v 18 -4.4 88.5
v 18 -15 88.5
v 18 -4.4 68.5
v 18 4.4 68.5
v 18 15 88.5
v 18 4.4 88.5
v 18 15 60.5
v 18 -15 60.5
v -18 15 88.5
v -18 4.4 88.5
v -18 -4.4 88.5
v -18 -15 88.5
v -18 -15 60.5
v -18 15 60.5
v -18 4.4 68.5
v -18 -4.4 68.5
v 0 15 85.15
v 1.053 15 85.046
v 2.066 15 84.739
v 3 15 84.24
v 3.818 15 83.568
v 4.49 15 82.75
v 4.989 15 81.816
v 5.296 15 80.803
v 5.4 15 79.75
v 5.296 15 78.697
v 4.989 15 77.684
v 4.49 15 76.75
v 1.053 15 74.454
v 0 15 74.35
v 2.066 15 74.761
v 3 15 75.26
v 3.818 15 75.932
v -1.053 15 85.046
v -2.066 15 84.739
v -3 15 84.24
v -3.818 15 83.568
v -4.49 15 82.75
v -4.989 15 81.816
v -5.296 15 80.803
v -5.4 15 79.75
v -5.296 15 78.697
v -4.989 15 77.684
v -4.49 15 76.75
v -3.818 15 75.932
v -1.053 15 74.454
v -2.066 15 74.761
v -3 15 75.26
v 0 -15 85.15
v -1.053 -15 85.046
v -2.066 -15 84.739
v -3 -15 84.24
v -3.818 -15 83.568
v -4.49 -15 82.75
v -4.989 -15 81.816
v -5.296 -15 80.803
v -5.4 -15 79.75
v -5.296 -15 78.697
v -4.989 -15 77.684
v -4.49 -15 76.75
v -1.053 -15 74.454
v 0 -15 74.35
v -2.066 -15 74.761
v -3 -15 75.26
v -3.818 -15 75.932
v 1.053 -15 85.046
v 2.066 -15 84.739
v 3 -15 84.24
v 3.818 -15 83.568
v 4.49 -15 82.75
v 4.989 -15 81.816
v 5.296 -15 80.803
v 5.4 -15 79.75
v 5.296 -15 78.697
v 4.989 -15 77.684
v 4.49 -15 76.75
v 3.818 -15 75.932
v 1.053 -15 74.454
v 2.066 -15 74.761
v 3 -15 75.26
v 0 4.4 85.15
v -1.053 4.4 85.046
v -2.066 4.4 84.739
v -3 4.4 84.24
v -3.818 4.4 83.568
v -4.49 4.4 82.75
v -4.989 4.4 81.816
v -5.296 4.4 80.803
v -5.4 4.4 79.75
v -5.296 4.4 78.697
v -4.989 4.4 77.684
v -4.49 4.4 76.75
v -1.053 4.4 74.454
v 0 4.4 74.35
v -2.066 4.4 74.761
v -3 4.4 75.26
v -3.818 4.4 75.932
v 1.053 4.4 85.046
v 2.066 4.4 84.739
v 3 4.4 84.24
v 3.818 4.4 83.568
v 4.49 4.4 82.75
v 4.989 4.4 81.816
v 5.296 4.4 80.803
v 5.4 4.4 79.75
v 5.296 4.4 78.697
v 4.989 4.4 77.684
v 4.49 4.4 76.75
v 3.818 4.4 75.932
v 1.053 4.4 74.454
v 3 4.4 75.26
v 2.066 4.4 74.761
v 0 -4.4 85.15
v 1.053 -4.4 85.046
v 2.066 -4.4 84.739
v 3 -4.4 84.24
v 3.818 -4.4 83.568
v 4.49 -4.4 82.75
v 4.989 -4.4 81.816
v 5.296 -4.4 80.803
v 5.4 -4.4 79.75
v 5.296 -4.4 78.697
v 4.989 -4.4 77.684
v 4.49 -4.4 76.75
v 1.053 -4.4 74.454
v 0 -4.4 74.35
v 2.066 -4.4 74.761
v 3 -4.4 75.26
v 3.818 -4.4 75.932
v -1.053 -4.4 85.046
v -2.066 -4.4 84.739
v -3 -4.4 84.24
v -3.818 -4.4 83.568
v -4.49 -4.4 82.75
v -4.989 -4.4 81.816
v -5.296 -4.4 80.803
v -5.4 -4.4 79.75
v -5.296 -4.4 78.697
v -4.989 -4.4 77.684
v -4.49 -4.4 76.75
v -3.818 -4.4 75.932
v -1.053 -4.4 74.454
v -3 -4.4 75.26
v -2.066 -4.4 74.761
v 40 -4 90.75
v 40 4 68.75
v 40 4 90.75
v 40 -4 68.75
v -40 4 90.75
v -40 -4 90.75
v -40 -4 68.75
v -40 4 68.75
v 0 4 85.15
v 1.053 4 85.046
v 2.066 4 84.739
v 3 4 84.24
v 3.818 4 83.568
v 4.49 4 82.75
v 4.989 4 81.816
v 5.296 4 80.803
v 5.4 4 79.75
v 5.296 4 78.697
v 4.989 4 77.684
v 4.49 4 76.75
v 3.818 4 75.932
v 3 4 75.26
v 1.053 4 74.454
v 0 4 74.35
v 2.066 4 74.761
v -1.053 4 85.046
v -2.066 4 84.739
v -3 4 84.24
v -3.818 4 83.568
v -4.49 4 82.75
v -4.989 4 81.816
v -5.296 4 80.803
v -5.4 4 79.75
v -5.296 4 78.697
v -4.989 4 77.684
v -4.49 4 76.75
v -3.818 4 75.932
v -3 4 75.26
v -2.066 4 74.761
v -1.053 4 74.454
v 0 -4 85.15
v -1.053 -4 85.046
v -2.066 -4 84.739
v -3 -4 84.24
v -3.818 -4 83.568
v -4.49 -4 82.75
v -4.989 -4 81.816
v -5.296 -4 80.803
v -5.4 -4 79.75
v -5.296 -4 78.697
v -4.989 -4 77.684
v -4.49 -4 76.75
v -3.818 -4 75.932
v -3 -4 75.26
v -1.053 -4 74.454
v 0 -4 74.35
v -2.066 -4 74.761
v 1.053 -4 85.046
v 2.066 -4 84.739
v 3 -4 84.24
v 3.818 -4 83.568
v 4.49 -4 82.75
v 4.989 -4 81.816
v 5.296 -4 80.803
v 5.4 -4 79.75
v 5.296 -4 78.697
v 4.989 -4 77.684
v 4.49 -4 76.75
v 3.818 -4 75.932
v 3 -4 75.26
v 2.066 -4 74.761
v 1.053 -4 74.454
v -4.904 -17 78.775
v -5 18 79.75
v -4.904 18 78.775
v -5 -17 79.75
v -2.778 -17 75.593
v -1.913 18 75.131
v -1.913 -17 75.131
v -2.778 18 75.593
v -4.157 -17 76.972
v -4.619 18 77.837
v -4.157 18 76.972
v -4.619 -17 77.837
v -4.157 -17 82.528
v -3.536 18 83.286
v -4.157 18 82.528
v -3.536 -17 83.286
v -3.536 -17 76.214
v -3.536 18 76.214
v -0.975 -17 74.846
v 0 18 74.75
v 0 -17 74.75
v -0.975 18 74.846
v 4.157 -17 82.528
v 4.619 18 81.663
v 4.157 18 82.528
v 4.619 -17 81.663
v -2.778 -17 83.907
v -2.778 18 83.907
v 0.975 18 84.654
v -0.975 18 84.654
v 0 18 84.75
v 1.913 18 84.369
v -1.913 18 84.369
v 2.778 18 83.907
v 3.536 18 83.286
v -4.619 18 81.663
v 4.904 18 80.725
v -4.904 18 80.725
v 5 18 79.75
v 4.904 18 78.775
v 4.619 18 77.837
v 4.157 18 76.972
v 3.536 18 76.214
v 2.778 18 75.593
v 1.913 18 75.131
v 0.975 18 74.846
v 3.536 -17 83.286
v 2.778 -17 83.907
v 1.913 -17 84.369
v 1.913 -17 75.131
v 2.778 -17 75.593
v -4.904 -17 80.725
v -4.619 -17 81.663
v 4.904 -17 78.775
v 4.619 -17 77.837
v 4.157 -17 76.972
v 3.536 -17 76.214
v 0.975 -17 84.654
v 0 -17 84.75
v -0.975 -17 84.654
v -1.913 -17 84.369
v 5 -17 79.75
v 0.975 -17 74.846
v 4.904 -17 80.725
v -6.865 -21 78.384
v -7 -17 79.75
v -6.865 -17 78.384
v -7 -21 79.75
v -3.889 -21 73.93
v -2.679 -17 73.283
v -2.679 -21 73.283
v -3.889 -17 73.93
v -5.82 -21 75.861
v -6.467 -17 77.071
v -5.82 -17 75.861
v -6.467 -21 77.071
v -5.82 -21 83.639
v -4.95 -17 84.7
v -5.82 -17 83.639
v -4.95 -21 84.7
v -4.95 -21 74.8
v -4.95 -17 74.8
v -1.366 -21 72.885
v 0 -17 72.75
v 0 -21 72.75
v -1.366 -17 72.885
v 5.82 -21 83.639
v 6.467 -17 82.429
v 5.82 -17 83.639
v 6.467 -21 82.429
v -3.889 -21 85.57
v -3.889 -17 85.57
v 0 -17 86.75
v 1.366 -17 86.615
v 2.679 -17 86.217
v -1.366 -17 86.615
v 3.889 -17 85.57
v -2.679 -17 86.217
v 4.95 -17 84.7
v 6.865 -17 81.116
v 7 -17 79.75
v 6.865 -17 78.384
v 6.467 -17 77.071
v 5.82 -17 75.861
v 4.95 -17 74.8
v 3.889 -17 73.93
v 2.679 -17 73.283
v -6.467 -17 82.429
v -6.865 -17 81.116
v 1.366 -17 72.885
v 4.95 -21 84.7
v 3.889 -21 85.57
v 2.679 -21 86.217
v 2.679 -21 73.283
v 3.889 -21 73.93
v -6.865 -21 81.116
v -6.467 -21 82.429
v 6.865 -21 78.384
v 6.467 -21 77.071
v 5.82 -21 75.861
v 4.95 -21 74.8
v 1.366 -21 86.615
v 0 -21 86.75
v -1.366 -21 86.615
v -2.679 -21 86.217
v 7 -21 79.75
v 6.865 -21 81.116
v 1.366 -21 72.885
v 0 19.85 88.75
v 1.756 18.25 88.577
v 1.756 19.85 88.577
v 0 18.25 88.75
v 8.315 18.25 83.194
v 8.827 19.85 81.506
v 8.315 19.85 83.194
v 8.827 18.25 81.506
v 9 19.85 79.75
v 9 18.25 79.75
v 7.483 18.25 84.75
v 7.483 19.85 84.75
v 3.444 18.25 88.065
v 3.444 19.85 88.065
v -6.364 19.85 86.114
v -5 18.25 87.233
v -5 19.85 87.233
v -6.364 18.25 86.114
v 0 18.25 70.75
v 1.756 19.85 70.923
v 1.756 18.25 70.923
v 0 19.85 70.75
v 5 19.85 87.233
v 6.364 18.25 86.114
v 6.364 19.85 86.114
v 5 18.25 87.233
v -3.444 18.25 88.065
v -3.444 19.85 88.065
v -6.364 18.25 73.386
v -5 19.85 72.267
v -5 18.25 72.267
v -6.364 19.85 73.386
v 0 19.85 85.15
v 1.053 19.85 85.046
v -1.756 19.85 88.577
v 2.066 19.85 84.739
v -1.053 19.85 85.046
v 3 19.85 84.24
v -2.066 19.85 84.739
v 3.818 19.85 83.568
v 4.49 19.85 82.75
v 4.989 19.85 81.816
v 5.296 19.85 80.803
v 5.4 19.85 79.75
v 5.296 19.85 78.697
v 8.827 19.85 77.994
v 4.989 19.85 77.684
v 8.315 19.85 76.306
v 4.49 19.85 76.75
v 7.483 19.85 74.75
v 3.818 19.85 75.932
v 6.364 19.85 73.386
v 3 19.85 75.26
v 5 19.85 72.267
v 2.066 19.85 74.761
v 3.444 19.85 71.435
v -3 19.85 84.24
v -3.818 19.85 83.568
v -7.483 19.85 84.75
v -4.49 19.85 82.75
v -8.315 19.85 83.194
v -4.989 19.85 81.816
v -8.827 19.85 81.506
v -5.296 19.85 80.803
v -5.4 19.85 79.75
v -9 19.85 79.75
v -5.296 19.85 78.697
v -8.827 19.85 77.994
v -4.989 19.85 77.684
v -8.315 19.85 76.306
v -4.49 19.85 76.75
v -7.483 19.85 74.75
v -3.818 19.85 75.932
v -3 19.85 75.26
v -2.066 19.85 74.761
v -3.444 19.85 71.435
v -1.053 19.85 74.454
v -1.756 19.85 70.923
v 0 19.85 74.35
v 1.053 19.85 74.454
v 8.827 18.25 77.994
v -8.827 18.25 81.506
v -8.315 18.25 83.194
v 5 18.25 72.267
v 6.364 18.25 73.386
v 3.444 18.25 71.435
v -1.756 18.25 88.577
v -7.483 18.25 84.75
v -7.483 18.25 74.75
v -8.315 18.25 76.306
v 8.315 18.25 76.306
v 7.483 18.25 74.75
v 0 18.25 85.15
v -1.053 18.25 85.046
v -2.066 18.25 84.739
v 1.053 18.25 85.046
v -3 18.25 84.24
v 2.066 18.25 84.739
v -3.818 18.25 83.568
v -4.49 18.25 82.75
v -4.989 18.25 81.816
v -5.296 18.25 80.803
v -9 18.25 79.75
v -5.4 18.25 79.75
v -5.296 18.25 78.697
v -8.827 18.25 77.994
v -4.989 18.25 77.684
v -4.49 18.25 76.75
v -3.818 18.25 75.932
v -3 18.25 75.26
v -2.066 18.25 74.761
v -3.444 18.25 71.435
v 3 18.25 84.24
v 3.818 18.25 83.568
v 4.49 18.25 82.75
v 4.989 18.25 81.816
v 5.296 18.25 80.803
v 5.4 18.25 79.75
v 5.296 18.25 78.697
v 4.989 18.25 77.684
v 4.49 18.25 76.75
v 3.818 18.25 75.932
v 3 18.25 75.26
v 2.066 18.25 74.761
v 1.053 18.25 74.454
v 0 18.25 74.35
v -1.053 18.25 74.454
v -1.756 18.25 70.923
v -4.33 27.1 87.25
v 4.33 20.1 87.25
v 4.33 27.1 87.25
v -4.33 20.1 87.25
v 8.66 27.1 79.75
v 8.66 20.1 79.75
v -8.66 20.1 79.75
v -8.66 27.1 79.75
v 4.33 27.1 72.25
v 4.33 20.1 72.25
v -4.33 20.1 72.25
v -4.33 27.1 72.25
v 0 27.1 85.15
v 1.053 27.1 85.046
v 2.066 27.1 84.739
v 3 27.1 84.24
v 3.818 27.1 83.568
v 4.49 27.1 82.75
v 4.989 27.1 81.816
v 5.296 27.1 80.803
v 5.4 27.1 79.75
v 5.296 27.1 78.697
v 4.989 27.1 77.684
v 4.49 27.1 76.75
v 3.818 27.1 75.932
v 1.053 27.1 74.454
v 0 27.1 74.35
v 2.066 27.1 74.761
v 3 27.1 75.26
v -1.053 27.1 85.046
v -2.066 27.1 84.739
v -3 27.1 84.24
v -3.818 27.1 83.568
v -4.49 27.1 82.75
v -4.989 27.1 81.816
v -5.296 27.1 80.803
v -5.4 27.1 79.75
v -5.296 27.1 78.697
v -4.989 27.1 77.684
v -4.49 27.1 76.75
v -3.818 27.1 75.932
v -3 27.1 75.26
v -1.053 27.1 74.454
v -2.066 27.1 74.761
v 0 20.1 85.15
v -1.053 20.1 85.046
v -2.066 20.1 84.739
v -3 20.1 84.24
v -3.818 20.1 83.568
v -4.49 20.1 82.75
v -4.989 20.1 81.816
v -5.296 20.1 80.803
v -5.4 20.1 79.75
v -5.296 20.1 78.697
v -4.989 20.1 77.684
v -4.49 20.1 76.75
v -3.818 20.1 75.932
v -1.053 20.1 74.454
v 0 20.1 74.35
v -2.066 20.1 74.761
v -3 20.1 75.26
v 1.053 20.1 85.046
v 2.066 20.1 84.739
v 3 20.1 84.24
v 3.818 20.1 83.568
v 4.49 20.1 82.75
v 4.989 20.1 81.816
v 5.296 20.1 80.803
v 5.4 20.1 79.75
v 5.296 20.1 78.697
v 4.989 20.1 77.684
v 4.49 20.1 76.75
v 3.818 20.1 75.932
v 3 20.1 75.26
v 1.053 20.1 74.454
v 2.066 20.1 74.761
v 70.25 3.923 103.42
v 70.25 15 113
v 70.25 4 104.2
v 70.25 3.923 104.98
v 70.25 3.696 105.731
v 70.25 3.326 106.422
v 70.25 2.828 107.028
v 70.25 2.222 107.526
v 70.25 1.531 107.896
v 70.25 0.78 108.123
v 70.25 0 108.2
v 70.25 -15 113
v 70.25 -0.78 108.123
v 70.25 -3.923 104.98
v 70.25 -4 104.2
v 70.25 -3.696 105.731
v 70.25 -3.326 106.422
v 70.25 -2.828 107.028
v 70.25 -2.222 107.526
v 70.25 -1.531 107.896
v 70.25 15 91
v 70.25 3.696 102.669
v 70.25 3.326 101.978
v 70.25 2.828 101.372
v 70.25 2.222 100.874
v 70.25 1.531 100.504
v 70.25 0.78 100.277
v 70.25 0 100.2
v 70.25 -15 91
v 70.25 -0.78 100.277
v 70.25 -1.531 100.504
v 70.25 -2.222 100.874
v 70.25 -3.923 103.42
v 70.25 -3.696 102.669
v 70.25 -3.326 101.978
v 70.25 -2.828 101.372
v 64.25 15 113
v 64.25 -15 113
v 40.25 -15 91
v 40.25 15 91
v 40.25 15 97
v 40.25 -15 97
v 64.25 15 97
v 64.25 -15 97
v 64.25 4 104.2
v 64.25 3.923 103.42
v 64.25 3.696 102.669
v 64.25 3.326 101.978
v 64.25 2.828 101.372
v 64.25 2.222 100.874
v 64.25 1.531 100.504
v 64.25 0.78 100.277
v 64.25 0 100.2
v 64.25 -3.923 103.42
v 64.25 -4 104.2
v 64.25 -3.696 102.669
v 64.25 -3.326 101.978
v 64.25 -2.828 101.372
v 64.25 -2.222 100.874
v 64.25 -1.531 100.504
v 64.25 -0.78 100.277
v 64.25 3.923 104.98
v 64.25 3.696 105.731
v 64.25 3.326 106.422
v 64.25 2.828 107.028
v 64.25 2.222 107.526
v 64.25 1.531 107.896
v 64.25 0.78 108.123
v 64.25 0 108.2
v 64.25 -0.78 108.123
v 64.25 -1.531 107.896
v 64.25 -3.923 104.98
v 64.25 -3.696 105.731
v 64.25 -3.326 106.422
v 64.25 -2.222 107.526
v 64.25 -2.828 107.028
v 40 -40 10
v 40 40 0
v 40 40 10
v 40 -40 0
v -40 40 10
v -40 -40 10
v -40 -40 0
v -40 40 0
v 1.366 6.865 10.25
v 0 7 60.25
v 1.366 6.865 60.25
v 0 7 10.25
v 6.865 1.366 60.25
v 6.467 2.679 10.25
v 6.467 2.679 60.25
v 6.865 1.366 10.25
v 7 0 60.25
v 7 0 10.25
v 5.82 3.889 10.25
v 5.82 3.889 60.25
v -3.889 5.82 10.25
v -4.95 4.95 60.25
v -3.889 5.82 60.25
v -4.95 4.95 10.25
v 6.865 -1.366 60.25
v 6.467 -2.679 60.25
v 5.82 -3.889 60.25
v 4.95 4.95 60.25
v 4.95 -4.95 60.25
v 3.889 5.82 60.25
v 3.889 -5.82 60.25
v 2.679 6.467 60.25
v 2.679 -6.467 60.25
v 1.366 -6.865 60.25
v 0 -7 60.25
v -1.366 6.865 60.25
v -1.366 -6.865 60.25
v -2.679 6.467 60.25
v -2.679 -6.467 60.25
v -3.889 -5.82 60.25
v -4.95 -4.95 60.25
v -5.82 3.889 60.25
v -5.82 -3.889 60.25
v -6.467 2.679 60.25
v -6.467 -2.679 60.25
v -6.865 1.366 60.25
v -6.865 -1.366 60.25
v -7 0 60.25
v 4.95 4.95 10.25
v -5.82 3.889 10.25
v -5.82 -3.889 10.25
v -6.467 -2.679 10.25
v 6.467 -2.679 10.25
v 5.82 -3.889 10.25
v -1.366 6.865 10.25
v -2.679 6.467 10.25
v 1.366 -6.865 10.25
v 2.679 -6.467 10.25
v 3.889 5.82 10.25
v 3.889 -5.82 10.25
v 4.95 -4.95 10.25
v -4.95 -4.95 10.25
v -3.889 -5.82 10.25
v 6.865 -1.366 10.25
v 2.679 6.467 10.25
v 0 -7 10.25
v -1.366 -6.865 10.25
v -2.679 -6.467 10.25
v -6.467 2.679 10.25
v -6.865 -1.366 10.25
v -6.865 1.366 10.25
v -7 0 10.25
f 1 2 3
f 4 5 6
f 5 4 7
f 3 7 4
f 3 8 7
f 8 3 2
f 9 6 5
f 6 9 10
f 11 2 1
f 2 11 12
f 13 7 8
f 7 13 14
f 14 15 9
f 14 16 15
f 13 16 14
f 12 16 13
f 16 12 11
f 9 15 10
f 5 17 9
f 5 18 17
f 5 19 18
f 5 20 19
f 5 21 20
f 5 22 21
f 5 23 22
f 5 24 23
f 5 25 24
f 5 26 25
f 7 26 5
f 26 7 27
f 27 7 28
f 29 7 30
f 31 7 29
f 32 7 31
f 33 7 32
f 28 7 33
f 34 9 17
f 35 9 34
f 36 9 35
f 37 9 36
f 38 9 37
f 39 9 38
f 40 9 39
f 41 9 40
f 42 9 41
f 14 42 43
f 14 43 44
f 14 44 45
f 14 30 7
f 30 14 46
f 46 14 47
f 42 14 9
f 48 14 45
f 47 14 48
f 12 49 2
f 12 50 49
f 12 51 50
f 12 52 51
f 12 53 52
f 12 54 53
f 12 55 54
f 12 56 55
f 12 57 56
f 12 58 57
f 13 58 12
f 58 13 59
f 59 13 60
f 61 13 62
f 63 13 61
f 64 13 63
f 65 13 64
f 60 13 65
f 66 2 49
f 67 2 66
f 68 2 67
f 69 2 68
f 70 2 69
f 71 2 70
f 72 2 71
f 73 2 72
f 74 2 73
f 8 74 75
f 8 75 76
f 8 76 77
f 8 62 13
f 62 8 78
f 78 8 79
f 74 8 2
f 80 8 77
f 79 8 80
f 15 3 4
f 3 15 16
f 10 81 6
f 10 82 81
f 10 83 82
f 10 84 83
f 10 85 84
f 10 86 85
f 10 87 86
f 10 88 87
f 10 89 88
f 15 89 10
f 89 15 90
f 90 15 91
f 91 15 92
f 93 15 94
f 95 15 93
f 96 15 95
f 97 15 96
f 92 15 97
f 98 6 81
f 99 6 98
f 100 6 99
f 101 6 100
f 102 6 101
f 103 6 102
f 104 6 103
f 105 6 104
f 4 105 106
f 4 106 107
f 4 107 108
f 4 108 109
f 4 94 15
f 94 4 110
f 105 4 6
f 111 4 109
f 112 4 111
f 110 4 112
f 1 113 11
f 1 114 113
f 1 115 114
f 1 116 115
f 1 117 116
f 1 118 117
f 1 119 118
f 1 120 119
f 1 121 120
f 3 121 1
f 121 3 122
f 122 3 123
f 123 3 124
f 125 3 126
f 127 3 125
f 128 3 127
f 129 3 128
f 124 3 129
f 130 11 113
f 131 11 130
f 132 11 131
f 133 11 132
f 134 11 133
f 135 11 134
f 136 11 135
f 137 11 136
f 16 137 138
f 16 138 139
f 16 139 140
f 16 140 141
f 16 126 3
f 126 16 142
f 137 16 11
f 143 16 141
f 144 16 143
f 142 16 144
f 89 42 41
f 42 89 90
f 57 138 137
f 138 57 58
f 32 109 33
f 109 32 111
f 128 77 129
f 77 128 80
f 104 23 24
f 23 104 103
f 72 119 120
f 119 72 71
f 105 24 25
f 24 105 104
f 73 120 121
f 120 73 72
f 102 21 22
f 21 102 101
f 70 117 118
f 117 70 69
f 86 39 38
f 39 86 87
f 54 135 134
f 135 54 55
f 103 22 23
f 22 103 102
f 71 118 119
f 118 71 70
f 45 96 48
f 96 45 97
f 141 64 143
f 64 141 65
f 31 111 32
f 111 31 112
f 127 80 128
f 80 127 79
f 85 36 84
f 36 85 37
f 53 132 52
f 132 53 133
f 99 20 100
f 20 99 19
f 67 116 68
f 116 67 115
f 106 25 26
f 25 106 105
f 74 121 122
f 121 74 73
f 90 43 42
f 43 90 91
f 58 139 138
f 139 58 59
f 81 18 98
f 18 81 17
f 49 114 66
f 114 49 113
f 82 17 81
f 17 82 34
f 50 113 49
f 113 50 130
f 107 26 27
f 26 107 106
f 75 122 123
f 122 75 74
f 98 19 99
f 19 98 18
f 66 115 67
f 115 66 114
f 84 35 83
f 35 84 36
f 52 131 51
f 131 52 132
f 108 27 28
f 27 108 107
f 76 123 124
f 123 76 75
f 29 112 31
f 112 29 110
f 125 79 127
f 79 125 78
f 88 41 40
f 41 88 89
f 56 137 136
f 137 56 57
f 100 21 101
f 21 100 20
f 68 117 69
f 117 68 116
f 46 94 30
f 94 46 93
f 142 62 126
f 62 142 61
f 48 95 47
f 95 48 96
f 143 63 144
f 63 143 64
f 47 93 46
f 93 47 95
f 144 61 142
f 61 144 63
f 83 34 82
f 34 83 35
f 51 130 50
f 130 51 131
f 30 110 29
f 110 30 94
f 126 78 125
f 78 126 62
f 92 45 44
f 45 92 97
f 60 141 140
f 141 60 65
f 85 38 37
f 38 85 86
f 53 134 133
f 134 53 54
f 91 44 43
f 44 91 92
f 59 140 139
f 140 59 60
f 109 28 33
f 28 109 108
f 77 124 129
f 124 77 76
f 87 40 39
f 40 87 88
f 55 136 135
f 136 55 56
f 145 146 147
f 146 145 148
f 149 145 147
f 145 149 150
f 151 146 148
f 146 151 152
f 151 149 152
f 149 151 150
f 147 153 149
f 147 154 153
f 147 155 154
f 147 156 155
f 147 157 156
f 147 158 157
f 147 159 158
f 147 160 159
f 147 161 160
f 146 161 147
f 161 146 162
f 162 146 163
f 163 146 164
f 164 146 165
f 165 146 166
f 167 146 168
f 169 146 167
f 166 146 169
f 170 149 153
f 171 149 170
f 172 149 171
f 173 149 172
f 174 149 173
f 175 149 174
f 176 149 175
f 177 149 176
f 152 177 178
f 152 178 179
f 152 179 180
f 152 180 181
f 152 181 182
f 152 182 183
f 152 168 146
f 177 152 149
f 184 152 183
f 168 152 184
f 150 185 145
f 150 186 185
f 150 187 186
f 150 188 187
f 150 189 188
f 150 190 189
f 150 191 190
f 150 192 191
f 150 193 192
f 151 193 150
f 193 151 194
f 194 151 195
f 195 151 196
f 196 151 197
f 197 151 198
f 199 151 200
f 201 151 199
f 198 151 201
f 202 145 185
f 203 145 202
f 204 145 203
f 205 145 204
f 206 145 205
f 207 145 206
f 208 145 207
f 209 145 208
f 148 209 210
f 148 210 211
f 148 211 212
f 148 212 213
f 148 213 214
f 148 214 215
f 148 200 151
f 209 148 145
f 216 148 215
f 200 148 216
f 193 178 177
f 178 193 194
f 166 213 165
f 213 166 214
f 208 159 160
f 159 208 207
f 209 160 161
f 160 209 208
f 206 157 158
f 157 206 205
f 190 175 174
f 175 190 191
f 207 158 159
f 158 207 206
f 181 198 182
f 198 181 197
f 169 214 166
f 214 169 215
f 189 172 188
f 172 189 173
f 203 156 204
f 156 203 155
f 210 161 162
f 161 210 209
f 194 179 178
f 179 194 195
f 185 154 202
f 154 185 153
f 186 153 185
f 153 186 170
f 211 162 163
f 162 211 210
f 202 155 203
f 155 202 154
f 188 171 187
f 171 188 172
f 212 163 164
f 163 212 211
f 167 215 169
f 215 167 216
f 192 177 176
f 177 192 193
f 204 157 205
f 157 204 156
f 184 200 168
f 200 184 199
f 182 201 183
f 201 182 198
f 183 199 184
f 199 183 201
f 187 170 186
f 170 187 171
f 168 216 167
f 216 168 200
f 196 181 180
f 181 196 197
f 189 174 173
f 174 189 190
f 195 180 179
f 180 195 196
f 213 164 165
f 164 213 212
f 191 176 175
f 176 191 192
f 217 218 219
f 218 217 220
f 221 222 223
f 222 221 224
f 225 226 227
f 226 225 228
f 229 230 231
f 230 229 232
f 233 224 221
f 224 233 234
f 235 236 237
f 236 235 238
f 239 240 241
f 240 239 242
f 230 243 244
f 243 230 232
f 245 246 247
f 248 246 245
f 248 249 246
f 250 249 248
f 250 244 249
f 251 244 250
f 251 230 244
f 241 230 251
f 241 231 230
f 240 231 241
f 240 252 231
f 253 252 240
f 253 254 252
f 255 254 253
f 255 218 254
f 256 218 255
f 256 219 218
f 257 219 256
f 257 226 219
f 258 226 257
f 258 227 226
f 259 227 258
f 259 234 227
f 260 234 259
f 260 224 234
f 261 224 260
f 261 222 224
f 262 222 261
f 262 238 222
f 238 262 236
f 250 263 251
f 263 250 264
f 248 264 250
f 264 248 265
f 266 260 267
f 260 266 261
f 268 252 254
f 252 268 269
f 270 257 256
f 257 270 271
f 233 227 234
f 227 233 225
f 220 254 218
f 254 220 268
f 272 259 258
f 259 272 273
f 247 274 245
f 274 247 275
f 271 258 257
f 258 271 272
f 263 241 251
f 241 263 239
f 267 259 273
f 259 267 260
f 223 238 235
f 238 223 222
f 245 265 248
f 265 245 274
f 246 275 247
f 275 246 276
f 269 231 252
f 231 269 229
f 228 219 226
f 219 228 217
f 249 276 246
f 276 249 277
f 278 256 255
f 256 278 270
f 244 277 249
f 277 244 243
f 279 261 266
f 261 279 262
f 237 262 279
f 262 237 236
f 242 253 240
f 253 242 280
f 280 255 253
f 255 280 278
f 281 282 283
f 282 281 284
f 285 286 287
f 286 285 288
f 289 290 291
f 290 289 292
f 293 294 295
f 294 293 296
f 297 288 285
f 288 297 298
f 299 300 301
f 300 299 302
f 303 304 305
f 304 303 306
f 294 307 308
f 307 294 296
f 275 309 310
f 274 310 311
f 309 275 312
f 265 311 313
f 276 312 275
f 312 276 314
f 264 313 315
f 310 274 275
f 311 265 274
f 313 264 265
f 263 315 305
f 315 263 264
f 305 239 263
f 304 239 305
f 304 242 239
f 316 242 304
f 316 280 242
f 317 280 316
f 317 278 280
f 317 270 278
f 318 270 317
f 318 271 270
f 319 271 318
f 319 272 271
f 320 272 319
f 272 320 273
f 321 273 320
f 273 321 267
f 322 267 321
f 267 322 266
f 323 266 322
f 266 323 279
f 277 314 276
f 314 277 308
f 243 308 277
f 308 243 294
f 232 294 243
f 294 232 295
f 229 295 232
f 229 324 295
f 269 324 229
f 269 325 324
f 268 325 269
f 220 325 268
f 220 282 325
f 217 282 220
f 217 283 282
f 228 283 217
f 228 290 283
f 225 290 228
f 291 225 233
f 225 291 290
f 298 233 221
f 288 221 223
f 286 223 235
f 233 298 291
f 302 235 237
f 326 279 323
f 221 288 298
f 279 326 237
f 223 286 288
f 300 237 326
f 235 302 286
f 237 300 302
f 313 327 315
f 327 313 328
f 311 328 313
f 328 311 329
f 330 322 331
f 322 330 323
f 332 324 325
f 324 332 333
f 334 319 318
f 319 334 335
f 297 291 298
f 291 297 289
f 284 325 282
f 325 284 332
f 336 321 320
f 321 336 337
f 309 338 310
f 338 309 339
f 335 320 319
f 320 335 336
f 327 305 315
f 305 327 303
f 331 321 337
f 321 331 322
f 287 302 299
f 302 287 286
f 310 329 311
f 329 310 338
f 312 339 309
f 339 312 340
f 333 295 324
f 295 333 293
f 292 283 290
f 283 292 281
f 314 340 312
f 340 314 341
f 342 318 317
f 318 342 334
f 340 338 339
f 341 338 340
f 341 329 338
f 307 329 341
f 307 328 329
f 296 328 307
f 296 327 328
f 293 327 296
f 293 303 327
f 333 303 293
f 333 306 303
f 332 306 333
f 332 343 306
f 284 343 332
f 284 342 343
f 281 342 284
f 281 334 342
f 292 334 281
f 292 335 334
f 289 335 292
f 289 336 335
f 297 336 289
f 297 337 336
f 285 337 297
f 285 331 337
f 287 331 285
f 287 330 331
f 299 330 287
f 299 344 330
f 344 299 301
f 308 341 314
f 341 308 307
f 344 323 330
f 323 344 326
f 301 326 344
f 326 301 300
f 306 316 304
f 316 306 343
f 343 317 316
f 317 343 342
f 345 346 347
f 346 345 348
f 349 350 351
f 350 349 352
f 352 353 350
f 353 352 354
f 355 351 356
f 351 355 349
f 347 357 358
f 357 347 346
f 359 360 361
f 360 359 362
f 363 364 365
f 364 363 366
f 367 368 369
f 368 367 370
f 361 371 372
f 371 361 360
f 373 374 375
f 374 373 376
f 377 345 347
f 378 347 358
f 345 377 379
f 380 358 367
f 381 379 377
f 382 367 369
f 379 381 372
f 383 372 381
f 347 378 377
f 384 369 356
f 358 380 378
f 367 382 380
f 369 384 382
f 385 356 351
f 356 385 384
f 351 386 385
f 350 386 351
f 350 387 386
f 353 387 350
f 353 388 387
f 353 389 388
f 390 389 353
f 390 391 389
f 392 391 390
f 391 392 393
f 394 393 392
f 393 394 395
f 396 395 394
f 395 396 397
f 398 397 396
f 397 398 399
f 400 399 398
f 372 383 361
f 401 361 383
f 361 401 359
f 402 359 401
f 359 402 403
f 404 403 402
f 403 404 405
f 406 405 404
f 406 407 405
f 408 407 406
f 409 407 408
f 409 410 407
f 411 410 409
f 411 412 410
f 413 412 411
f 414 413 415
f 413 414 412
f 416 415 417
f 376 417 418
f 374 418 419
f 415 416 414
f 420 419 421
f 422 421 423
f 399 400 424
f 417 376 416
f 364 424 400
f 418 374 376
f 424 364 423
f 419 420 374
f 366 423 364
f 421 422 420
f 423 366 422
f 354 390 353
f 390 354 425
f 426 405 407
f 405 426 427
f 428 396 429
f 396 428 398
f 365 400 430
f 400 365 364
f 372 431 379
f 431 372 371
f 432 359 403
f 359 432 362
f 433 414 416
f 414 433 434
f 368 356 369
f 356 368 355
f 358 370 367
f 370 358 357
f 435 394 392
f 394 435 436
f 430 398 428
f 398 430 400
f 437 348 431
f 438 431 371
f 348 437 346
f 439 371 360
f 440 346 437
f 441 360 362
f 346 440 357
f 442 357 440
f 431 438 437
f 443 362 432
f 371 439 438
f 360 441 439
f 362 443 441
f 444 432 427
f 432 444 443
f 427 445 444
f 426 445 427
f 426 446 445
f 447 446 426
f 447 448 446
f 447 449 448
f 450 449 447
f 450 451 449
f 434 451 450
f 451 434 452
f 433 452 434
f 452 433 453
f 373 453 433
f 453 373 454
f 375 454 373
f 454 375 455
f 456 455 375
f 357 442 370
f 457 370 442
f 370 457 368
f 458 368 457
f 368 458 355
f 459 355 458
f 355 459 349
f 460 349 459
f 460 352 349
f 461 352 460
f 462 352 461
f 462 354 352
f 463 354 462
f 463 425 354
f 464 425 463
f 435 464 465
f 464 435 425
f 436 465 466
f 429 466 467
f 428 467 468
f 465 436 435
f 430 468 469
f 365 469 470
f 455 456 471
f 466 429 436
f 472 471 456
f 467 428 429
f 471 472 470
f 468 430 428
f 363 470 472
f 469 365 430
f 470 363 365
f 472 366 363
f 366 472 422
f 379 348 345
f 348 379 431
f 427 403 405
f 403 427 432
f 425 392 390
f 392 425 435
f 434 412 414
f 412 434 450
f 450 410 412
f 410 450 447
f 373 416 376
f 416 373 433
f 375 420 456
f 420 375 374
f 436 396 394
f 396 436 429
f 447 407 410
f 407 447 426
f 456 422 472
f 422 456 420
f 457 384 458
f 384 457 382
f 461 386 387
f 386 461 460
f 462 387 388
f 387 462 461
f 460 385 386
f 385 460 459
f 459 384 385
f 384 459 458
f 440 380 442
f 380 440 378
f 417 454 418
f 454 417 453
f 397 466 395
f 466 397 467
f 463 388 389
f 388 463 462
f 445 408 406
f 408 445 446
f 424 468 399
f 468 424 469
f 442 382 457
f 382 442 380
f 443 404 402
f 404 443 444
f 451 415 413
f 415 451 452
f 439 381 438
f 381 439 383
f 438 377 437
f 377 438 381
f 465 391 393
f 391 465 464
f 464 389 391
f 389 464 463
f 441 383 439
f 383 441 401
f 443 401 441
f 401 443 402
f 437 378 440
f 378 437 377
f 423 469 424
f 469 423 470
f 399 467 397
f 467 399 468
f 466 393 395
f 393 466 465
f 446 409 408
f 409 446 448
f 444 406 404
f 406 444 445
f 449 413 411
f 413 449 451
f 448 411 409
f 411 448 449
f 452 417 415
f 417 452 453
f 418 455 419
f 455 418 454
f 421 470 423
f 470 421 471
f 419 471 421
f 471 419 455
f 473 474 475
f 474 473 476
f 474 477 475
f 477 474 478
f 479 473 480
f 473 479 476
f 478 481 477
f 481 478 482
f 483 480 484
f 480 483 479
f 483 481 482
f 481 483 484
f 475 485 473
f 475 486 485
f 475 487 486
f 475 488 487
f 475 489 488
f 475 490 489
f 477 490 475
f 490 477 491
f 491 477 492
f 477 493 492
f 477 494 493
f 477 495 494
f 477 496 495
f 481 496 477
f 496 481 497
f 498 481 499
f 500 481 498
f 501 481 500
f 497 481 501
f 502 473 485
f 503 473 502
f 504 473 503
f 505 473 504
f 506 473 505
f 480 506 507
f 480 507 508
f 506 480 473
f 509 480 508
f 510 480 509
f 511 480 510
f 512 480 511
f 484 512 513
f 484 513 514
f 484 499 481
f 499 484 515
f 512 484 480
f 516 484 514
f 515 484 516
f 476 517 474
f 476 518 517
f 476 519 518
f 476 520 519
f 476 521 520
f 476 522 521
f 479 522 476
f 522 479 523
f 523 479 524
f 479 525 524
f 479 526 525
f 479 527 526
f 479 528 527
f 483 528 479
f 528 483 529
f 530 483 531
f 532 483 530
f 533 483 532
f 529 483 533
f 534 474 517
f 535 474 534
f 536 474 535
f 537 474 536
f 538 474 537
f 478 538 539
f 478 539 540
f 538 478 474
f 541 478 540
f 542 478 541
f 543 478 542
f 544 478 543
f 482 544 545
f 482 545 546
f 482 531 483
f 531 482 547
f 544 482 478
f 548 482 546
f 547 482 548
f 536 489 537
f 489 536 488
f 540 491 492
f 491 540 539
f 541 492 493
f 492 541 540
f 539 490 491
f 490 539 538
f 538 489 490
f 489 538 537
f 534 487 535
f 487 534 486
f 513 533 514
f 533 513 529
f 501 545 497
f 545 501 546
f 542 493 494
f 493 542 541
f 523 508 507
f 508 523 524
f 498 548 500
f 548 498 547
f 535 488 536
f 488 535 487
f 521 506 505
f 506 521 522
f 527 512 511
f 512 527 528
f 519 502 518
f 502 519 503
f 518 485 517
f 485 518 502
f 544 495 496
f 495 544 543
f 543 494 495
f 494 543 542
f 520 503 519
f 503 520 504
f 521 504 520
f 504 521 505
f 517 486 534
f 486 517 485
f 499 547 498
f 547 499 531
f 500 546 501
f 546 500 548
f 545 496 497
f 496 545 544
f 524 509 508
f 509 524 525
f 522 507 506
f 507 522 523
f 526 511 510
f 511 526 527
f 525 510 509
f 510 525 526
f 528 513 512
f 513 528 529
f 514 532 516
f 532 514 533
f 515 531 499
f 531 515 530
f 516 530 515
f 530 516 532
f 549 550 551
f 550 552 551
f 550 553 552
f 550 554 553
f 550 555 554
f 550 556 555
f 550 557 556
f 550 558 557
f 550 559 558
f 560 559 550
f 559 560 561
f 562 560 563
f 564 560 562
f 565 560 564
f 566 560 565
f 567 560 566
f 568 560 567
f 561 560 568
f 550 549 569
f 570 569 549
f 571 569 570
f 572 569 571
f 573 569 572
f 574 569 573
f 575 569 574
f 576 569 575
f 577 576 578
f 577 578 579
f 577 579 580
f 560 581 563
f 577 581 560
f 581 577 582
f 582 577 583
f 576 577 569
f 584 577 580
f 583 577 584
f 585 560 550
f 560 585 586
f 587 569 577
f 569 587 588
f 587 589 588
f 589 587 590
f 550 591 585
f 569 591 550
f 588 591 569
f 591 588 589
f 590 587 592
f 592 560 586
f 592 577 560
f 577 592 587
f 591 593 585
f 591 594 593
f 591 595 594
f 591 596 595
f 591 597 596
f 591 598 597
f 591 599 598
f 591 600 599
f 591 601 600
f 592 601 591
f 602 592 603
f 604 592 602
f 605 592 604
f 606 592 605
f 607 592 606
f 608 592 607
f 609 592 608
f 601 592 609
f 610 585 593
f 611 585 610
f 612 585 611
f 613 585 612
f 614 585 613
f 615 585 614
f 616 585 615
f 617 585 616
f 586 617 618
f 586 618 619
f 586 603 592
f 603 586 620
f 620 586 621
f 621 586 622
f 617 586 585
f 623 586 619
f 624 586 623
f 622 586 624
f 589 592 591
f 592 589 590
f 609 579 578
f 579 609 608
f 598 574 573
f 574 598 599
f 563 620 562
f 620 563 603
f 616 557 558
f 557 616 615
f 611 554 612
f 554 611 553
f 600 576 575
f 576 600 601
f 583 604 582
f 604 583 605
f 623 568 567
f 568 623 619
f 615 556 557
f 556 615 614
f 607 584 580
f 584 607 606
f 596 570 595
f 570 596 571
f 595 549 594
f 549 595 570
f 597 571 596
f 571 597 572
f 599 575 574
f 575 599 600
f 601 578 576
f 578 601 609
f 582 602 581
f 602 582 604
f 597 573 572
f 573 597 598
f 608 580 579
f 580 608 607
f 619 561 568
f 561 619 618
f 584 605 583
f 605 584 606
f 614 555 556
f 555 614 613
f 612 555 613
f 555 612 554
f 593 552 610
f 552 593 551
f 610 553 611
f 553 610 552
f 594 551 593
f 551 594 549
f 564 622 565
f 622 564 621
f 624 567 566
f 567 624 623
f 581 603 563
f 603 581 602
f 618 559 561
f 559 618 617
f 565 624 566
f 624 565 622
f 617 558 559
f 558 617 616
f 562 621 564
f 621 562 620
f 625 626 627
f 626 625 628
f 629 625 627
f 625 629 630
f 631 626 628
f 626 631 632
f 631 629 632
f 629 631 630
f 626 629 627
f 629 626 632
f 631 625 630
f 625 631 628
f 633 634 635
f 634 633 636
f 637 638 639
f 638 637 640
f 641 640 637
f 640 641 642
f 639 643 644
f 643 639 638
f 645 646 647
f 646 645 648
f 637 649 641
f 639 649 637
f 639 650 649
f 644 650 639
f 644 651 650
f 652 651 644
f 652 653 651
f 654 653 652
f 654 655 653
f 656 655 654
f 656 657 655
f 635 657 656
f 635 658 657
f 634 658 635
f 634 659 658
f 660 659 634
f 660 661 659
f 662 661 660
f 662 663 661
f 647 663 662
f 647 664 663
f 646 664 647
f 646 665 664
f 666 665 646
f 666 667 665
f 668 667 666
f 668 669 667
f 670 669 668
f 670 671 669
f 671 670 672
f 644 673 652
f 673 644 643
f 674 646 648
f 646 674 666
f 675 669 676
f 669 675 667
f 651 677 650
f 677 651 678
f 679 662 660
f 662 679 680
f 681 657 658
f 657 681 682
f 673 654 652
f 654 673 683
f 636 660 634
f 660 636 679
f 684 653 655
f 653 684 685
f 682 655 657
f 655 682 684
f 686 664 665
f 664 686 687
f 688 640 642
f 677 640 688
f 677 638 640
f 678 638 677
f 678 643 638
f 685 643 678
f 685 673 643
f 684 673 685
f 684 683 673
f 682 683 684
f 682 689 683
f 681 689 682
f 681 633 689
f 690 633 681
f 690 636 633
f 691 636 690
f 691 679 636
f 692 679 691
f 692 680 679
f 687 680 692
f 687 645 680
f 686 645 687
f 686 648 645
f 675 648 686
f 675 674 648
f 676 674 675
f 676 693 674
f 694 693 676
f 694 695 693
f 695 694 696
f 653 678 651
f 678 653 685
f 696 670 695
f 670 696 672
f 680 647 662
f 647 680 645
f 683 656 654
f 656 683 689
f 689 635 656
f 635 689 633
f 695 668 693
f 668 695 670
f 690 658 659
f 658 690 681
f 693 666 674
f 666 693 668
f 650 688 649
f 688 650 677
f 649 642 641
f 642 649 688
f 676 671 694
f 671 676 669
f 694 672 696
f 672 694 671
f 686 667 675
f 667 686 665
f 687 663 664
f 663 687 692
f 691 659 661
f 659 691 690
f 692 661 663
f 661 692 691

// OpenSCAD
$fn = 32;

// ------------------------------------------------------------------------
// Lamp arm: column d14 x 50 mm, arm 80 mm
// Every part is its own module, assembly() places every instance.
// ------------------------------------------------------------------------

// --- part 1 ---
module lamp_base() {
  difference() {
    translate([-40, -40, 0]) cube([80, 80, 10]);
  }
}

// --- part 2 ---
module lamp_column() {
  cylinder(h = 50, d = 14);
}

// --- part 3 ---
module head_fork() {
  difference() {
    translate([-18, -15, 0]) cube([36, 30, 28]);
    translate([-19, -4.4, 8]) cube([38, 8.8, 21]);
    translate([0, 0, 19.25]) rotate([90, 0, 0]) cylinder(h = 32, d = 10.8, center = true);
  }
}

// --- part 4 ---
module lamp_arm() {
  difference() {
    translate([-40, -4, 0]) cube([80, 8, 22]);
    translate([0, 0, 11]) rotate([90, 0, 0]) cylinder(h = 10, d = 10.8, center = true);
  }
}

// --- part 5 ---
module arm_pin() {
  rotate([0, 90, 0]) cylinder(h = 36, d = 10, center = true);
  translate([-21, 0, 0]) rotate([0, 90, 0]) cylinder(h = 4, d = 14);
}

// --- part 6 ---
module arm_washer() {
  difference() {
      translate([0, 0, 0]) cylinder(h = 1.6, d = 18);
      translate([0, 0, -1]) cylinder(h = 3.6, d = 10.8);
    }
}

// --- part 7 ---
module arm_nut() {
  difference() {
    linear_extrude(height = 7) polygon(points = [[8.66, 0], [4.33, 7.5], [-4.33, 7.5], [-8.66, 0], [-4.33, -7.5], [4.33, -7.5]]);
    translate([0, 0, -1]) cylinder(h = 9, d = 10.8);
  }
}

// --- part 8 ---
module shade_bracket() {
  difference() {
    translate([-15, -15, 0]) cube([30, 30, 22]);
    translate([-16, -16, 6]) cube([25, 32, 17]);
    translate([12, 0, 13.2]) rotate([0, 90, 0]) cylinder(h = 8, d = 8, center = true);
  }
}

// --- assembly ---
module assembly() {
  color([0.80, 0.24, 0.20]) translate([0, 0, 0]) rotate([0, 0, 0]) lamp_base();
  color([0.20, 0.45, 0.75]) translate([0, 0, 10.25]) rotate([0, 0, 0]) lamp_column();
  color([0.25, 0.62, 0.32]) translate([0, 0, 60.5]) rotate([0, 0, 0]) head_fork();
  color([0.92, 0.70, 0.18]) translate([0, 0, 68.75]) rotate([0, 0, 0]) lamp_arm();
  color([0.58, 0.35, 0.70]) translate([0, 0, 79.75]) rotate([0, 0, 90]) arm_pin();
  color([0.16, 0.66, 0.66]) translate([0, 19.85, 79.75]) rotate([90, 0, 0]) arm_washer();
  color([0.85, 0.48, 0.18]) translate([0, 27.1, 79.75]) rotate([90, 0, 0]) arm_nut();
  color([0.55, 0.60, 0.65]) translate([55.25, 0, 91]) rotate([0, 0, 0]) shade_bracket();
}

assembly();
